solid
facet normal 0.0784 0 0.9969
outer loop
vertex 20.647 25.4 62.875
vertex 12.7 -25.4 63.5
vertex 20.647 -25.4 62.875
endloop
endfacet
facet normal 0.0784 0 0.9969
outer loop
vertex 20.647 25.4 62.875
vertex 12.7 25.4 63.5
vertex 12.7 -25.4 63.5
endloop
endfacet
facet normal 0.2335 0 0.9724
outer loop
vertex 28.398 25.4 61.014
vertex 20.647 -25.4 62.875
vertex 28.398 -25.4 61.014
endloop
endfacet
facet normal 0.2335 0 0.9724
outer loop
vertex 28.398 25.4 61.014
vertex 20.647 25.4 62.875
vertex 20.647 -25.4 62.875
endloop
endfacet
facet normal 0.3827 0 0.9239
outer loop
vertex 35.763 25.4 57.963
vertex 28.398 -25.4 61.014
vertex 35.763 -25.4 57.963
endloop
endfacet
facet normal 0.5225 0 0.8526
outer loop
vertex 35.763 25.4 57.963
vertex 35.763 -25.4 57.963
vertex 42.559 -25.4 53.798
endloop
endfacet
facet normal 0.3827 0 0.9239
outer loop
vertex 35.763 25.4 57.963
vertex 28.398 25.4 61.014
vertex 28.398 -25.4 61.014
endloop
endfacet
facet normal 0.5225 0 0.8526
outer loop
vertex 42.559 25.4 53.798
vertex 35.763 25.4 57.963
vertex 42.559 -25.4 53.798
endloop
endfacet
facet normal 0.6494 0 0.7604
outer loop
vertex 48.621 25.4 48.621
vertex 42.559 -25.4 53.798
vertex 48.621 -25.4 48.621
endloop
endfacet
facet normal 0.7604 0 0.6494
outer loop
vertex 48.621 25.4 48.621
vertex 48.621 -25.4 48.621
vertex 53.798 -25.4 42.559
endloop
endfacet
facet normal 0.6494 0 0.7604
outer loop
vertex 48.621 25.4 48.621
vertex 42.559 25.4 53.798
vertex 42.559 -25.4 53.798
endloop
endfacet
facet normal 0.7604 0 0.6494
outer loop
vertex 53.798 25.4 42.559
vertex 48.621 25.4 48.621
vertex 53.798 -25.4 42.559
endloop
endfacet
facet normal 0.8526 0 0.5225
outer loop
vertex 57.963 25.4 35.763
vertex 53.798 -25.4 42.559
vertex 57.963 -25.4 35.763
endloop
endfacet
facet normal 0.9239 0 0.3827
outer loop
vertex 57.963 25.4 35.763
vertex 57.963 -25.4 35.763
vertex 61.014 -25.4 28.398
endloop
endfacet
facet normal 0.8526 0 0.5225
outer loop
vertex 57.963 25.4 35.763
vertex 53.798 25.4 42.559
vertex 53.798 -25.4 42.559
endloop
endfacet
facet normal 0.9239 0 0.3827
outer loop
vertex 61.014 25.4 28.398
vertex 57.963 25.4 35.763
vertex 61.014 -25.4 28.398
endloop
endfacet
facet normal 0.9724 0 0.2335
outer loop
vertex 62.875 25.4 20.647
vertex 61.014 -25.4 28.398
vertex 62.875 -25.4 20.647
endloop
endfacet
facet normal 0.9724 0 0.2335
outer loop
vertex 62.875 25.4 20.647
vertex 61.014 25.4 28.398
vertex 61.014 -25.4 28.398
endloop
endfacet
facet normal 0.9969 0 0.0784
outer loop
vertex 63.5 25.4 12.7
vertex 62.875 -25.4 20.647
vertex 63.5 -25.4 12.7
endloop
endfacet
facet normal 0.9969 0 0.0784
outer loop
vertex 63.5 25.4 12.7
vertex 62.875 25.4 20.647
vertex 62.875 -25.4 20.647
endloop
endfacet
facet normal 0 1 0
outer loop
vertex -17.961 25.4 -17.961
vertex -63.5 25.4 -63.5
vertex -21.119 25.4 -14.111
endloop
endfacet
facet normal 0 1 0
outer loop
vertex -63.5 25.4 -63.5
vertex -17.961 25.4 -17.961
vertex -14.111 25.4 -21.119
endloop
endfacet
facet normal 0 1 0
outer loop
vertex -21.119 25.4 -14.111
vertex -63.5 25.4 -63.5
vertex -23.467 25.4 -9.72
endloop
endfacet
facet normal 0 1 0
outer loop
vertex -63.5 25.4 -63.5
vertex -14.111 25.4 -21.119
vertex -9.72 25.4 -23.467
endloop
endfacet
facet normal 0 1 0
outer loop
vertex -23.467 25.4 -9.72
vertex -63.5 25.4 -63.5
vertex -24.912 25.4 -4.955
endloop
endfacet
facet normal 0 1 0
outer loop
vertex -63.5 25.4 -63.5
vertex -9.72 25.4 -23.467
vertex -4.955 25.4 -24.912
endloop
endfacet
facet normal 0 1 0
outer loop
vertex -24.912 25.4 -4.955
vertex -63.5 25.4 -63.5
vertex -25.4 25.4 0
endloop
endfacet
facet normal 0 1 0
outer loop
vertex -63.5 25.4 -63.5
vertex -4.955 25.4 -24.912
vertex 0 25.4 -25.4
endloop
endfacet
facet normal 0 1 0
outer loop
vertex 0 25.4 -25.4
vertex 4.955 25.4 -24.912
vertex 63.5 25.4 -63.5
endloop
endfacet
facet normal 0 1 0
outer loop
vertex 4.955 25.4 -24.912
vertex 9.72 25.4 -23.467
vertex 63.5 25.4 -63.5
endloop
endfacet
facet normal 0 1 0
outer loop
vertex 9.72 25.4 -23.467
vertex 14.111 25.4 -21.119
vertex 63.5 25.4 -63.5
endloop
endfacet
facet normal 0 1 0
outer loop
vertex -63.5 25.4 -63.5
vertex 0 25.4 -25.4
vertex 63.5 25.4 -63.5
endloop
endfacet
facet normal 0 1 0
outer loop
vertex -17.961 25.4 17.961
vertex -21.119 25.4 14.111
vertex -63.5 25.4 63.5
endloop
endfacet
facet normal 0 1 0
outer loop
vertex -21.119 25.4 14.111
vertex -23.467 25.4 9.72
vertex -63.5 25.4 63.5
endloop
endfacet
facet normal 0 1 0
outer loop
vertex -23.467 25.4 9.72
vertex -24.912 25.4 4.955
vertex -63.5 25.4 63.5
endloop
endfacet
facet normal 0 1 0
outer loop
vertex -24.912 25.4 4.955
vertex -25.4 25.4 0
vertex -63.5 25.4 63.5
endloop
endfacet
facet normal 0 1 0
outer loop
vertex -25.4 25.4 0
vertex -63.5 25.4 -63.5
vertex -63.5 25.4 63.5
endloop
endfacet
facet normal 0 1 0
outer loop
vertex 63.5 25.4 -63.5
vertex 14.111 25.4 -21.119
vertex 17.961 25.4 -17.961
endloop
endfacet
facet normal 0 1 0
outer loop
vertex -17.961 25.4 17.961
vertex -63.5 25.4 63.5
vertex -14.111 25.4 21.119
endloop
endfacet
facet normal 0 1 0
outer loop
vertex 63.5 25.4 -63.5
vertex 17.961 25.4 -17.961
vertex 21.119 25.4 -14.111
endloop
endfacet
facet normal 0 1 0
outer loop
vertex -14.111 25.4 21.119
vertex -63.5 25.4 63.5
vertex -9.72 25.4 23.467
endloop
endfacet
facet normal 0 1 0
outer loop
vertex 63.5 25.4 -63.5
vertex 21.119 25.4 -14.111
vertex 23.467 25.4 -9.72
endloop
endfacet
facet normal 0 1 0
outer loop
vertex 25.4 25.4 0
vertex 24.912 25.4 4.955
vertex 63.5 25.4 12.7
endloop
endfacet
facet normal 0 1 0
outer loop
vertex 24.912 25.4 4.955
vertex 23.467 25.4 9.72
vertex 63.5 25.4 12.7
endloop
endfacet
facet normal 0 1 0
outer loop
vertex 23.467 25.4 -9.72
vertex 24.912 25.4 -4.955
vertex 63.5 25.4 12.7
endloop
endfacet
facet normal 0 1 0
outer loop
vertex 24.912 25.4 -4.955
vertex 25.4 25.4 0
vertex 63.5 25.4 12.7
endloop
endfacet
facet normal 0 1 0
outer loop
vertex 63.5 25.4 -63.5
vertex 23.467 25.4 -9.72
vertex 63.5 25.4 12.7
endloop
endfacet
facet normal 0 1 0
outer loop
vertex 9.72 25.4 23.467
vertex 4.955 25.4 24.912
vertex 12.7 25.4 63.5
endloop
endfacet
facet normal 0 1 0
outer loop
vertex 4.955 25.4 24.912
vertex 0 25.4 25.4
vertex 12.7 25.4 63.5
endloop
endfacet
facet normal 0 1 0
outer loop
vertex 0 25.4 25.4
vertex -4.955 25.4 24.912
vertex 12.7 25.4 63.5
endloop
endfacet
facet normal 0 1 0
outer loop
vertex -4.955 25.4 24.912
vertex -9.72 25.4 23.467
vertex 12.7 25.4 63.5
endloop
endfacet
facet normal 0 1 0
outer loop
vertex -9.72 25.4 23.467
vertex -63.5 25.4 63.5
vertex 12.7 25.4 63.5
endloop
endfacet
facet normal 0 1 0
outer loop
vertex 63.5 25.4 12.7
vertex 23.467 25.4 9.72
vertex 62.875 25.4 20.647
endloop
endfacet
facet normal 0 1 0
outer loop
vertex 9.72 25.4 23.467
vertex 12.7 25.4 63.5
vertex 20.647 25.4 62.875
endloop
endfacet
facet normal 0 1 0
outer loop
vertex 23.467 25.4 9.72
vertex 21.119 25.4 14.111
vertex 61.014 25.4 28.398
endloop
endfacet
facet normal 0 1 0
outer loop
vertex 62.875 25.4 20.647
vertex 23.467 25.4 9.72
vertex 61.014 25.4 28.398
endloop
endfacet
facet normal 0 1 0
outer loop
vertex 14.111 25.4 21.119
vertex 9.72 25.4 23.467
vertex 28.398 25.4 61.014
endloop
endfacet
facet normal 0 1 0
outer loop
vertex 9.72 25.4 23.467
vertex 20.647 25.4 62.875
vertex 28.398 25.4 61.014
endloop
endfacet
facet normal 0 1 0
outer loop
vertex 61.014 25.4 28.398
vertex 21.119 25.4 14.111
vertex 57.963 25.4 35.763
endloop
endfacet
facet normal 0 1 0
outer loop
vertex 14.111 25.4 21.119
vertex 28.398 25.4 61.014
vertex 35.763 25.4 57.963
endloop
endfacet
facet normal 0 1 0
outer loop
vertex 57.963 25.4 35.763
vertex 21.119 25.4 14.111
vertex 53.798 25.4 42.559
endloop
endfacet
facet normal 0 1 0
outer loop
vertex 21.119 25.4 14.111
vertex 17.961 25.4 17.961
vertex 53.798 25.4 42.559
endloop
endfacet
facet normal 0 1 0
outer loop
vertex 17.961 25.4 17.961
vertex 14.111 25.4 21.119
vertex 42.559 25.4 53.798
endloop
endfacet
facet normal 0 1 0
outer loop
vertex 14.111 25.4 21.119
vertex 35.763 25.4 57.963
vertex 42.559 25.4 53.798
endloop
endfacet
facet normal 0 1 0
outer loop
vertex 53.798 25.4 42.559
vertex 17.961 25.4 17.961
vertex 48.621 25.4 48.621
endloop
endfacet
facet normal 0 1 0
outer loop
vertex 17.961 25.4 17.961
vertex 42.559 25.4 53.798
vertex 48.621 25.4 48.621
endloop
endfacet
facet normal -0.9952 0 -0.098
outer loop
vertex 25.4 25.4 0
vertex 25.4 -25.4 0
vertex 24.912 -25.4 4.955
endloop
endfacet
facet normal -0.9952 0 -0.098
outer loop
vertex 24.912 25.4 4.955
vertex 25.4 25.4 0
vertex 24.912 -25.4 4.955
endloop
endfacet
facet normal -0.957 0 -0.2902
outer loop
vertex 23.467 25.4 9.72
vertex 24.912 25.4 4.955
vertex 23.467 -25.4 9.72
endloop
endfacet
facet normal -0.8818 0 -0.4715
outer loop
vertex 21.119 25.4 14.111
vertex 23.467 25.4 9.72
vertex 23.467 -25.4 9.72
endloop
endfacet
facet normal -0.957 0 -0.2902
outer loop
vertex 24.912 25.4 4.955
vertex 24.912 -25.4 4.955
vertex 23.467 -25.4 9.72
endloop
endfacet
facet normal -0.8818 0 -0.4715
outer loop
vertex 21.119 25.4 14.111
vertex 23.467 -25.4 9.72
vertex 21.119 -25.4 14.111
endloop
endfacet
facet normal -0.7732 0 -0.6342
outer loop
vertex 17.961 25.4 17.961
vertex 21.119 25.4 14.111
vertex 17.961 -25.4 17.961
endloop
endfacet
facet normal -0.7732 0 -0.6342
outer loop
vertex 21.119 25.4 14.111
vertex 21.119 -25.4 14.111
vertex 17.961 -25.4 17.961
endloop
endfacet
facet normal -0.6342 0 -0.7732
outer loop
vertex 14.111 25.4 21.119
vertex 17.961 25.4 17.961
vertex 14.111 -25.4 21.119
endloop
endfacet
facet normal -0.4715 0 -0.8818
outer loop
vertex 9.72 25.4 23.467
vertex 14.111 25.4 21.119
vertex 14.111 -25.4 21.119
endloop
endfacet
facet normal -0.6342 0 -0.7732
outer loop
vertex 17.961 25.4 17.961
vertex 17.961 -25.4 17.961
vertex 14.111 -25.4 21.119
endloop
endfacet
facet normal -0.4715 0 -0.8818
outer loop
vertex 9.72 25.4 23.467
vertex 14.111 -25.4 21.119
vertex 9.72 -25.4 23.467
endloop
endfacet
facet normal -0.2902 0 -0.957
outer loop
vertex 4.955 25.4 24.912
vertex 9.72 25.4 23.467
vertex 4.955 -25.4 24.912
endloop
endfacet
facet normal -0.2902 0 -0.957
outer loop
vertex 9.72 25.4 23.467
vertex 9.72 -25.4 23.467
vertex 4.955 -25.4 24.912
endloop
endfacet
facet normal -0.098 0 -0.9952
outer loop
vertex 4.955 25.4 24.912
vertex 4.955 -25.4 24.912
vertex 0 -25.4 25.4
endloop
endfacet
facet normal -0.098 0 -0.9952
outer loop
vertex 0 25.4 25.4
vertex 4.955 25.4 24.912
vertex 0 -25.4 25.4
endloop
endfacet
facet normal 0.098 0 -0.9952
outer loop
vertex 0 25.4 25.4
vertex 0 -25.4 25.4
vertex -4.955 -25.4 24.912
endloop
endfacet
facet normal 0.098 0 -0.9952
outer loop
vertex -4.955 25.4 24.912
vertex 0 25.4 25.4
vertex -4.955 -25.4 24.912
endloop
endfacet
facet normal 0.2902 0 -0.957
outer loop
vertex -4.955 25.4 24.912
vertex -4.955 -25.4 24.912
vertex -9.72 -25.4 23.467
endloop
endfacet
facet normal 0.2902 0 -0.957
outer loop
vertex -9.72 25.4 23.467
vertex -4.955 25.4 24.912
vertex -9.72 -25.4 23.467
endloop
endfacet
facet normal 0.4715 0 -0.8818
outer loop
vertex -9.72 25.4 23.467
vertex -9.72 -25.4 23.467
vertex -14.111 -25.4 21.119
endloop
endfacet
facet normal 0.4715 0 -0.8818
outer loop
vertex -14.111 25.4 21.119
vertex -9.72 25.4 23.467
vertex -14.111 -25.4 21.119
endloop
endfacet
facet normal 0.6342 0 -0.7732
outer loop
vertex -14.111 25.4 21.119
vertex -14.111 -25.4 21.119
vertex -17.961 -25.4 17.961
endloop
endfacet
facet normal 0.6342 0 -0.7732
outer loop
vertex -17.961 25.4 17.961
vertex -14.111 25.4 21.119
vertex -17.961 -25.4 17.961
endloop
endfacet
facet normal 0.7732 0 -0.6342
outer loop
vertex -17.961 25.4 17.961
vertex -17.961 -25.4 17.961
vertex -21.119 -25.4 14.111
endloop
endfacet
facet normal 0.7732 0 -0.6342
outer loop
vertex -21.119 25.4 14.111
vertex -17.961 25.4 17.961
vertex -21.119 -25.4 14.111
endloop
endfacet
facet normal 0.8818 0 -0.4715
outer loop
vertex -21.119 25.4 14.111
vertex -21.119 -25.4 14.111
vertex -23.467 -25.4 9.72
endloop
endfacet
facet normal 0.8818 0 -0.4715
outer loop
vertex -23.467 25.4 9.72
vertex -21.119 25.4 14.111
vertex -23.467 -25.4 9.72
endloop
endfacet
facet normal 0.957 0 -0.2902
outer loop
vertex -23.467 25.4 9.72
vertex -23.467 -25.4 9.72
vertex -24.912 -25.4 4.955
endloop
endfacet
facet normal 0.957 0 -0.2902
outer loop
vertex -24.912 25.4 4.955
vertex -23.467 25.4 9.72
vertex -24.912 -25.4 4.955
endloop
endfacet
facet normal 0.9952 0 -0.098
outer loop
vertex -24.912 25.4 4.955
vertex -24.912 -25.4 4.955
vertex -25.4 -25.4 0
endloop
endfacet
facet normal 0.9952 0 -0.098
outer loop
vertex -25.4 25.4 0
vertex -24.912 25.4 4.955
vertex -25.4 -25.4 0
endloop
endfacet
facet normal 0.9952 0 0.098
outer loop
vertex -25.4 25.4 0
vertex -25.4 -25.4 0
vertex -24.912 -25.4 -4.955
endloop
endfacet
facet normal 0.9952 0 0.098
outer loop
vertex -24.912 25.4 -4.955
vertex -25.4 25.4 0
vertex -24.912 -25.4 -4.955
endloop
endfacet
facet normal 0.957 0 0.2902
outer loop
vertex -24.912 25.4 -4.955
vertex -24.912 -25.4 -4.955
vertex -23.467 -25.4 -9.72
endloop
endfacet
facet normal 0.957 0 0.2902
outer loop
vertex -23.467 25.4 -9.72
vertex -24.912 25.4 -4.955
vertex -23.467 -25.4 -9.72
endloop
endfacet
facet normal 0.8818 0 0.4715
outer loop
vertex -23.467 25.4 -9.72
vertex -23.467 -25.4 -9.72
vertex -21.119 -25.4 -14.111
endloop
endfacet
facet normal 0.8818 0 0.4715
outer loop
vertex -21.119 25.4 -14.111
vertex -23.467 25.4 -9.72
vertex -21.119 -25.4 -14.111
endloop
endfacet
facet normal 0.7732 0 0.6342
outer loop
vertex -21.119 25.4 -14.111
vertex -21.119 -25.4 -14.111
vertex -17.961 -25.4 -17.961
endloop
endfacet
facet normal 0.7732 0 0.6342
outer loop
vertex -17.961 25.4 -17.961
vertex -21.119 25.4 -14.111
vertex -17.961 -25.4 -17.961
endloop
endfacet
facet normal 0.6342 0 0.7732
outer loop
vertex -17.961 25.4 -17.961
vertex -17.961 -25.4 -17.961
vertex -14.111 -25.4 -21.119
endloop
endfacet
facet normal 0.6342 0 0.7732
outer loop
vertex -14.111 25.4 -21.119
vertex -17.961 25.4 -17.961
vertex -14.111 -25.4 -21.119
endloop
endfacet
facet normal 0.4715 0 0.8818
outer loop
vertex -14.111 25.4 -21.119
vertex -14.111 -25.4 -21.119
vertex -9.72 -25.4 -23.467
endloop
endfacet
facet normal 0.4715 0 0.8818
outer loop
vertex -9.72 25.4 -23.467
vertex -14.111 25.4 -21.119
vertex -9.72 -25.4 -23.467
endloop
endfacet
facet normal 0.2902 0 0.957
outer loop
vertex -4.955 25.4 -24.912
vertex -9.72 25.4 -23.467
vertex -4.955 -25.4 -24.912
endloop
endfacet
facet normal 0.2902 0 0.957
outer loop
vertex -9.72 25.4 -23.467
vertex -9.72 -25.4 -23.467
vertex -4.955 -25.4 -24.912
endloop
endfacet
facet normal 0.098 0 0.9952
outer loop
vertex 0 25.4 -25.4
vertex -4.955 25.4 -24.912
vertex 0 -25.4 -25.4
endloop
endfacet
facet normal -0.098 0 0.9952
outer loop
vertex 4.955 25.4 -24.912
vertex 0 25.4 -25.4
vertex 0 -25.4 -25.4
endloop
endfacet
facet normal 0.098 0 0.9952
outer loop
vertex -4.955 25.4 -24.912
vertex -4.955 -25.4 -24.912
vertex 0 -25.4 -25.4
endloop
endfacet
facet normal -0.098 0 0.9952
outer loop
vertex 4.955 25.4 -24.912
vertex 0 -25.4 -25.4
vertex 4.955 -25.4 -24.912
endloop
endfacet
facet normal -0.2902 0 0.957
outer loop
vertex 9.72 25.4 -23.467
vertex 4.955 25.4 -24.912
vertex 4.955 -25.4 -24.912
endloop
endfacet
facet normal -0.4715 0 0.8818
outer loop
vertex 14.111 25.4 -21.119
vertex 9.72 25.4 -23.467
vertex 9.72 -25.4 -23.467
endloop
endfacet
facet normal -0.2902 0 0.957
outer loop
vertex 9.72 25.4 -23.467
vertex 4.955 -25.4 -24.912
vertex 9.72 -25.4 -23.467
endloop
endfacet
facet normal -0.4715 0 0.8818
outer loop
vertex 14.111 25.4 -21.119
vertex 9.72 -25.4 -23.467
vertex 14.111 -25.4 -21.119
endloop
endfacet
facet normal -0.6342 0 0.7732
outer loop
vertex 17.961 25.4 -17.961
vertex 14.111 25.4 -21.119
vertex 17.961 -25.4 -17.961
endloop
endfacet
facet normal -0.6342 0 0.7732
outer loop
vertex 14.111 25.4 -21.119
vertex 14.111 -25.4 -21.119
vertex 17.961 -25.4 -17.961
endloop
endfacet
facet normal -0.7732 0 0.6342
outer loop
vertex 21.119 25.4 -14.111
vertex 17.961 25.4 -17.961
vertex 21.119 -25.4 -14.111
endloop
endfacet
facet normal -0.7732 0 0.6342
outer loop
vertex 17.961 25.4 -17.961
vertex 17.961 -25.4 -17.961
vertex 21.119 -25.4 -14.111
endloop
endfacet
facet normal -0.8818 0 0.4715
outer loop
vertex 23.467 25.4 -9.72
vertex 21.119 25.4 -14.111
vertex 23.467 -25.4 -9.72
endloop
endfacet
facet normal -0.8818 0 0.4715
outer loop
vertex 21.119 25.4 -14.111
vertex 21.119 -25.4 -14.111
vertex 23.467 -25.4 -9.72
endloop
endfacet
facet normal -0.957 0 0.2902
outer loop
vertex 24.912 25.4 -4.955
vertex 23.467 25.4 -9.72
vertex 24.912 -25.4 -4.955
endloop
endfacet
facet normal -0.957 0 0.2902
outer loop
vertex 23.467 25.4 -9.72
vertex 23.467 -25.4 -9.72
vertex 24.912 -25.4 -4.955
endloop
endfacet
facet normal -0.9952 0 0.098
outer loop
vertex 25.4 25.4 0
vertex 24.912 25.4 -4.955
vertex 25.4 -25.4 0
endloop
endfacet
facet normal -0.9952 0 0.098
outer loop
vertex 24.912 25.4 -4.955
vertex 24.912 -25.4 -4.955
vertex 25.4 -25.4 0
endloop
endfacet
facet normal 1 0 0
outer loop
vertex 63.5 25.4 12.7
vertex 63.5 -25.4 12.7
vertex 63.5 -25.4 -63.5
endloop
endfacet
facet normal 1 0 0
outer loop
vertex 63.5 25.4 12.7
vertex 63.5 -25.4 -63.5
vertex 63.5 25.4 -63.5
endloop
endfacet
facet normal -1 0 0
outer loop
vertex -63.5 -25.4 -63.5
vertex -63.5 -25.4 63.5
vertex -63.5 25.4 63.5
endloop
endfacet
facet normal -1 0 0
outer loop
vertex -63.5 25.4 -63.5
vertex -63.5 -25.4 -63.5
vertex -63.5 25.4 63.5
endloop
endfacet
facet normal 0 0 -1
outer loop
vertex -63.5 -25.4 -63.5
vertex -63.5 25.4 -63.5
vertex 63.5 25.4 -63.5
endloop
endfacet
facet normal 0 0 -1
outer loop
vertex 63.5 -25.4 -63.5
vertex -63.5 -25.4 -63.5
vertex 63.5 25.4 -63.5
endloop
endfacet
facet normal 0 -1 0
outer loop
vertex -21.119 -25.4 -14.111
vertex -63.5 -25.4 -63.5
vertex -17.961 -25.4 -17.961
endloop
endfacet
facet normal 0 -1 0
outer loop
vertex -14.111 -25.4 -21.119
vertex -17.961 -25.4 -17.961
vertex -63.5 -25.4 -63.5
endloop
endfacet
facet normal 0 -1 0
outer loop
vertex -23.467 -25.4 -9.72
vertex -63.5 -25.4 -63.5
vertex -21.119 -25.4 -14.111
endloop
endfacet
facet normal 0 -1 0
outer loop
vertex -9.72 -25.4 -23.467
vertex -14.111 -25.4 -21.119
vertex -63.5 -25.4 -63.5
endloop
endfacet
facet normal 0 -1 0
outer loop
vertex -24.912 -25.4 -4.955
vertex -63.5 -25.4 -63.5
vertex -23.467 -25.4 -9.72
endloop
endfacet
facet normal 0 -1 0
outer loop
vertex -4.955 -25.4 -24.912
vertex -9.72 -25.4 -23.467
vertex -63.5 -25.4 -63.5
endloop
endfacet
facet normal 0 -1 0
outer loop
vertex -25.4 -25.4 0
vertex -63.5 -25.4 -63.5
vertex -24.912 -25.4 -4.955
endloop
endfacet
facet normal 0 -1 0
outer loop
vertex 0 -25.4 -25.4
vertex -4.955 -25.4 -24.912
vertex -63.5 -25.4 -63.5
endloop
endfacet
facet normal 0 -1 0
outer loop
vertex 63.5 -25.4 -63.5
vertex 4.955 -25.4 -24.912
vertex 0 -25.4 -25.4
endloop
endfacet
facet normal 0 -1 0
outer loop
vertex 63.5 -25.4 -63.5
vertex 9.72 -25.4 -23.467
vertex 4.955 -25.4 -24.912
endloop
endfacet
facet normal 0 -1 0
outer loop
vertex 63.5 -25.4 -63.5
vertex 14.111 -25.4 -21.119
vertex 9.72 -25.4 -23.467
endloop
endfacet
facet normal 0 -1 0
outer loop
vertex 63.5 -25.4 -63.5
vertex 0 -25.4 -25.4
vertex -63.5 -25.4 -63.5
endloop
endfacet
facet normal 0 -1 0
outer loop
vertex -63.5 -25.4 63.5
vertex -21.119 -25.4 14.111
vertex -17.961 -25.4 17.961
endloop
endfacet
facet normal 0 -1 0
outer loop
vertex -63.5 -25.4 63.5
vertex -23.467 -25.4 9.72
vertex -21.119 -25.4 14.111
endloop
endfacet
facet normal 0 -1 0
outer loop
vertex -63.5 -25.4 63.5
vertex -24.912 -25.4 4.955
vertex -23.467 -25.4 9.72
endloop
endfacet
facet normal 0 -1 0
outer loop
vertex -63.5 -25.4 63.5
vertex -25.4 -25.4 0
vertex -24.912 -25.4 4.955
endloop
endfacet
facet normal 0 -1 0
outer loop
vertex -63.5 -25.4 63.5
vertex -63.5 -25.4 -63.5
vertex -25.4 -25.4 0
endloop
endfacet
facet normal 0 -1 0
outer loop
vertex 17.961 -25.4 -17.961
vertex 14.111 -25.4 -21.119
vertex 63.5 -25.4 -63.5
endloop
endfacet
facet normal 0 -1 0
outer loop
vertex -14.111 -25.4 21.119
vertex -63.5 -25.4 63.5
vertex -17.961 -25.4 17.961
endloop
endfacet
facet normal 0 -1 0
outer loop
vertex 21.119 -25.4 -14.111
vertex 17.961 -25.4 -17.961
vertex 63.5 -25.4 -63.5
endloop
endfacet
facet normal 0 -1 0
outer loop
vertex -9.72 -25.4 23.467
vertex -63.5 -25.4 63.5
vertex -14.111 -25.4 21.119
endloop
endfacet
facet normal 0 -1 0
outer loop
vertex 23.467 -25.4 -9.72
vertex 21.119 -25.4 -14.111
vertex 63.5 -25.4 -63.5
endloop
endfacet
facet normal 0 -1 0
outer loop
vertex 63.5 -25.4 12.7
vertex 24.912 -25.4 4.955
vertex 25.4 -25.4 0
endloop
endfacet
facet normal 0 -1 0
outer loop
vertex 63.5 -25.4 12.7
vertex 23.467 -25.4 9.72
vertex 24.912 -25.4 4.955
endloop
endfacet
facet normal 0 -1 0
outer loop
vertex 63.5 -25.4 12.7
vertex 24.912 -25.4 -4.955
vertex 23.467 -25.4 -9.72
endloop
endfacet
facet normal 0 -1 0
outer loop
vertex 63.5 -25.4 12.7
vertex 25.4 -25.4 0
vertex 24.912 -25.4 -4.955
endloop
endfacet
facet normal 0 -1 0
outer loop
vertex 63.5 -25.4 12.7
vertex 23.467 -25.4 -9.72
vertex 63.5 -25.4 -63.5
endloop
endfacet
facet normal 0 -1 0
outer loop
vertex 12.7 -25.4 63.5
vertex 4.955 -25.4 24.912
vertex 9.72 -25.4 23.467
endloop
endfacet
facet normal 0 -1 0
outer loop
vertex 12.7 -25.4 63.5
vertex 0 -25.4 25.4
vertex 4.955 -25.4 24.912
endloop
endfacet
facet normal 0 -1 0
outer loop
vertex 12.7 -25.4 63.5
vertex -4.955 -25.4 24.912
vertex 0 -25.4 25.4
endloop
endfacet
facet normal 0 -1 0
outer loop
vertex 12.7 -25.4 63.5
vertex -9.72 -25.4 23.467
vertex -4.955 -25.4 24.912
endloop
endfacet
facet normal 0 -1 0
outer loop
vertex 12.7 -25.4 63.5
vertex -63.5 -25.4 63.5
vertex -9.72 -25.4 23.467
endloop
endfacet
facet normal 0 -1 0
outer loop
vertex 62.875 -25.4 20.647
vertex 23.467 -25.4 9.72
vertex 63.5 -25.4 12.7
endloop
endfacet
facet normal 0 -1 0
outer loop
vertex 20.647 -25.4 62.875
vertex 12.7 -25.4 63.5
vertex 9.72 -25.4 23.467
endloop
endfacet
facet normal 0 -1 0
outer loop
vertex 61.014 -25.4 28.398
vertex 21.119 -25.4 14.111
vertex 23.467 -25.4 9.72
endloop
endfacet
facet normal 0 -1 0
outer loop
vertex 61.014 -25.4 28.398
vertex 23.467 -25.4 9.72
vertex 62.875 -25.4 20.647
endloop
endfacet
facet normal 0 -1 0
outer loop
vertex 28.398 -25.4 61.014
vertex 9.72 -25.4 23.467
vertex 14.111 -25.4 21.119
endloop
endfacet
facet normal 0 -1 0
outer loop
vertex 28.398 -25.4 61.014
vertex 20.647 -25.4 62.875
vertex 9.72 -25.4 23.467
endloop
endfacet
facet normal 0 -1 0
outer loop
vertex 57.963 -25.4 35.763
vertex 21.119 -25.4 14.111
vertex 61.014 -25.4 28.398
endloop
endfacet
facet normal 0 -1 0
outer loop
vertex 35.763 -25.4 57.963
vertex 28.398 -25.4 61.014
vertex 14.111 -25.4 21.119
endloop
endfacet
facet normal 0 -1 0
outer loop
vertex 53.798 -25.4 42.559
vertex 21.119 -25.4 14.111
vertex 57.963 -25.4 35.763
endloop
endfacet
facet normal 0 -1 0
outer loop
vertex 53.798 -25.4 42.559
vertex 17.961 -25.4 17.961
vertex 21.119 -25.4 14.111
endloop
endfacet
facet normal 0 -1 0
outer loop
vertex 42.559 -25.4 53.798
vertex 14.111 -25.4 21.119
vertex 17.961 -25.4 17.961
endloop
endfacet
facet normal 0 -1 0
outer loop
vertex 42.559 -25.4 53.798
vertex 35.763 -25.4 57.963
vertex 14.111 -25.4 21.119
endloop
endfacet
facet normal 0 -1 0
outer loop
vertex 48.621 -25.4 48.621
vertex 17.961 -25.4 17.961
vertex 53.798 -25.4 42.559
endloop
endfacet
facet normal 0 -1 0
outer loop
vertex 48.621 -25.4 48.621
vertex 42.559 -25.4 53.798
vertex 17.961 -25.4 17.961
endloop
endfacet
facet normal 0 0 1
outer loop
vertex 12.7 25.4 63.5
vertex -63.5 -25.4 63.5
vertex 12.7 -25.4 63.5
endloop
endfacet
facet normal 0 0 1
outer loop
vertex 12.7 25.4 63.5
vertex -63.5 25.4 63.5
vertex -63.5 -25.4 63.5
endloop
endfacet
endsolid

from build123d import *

# Parameters (mm, degrees)
F0_W     = 127
F0_H     = 50.8
F1_DEPTH = 63.5
F2_R     = 50.8
F3_R     = 25.4
F4_DEPTH = 50.801


with BuildPart() as f1:
    # F0 (on Top) → F1 (new body, symmetric)
    with BuildSketch(Plane.XY):
        Rectangle(F0_W, F0_H)
    extrude(amount=F1_DEPTH, both=True)

    # F2
    f2_edges = [f1.edges().sort_by_distance(p)[0] for p in [
        (63.5, 0, 63.5),
    ]]
    fillet(f2_edges, radius=F2_R)

    # F3 (on face) → F4 (cut, through all)
    with BuildSketch(Plane.XZ.offset(25.4)):
        Circle(F3_R)
    extrude(amount=-F4_DEPTH, mode=Mode.SUBTRACT)


solid = f1.part
